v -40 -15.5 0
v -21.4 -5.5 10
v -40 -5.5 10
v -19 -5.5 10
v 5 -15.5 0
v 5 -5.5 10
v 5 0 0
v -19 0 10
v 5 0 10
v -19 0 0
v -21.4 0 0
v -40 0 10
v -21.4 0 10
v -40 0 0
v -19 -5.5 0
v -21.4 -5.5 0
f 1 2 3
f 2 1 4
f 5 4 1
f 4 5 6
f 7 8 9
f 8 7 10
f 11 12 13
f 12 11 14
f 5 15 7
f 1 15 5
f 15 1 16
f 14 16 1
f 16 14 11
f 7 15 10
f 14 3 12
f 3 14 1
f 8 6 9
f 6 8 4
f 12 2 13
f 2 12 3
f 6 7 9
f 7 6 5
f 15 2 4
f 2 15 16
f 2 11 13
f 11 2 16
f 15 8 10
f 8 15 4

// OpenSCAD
// file: wigleUnit.scad
include <utils.scad>;
include <design.scad>;

build = 0;


module wigle_cyl(theta, A_in, A_out, t, wall_t, R, phi0, phi1, cyl, a){
    

    a1 = R*(2*Pi)/dt;

    //a1 = a;
     
    rotate_extrude(angle = phi1 - phi0, $fn = a1) wigle(theta, A_in, A_out, t, wall_t, R, 0, cyl, a);
    }

module wigle_bar(theta, A_in, A_out, t, wall_t, L, solid, cyl, a){
    translate([0, -9*wall_t, 0]) rotate([90,0,90]) linear_extrude(height = L, $fn = a)
        
    wigle(theta, A_in, A_out, t, wall_t, 10*wall_t, solid, cyl, a);
}

module wigle(theta, A_in, A_out, t, wall_t, R, solid, cyl, a){
    
    
    // Wigle
    function fx(i,a,A,t, phase) = A*pow(sin(phase + 180*i/a), 2); 
    function fy(i,a,t) = t*i/a;
    
    theta_in = solid == 1 ? 0 : theta;
    A_in_ = solid == 1 ? 0 : A_in;
    t_in = solid == 1 ? t*cos(theta) : t;
    
    // SINE CORNER:
    points_in = [for (i=[0:1:a]) [max(0, R + cos(theta_in)*fx(i,a,A_in_,t_in,theta_in/2) + sin(theta_in)*fy(a-i,a,t_in) - wall_t), -sin(theta_in)*fx(i,a,A_in_,t_in,theta_in/2) + cos(theta_in)*fy(a-i,a,t_in)]];
    points_out = [for (i=[0:1:a]) [max(0, R + cos(theta)*fx(i,a,A_out,t, 0) + sin(theta)*fy(i,a,t)), -sin(theta)*fx(i,a,A_out,t,0) + cos(theta)*fy(i,a,t)]];
    points_wigle = concat(points_in, points_out);
    
    
    // SPHERE CORNER:
    function fx_sphere(i,a,t) = t*cos(theta + (90-theta)*i/a) - t*cos(theta); 
    function fy_sphere(i,a,t) = t*sin(theta + (90-theta)*i/a) - t*sin(theta);
    function fy_straight(i,a,t) = i/a*t*(1-sin(theta)); 
    
    points_in_sphere = [for (i=[0:1:a]) [max(0, R - max(wall_t, t*cos(theta))), max(0, fy_straight(i,a,t))]];
    points_out_sphere = [for (i=[a:-1:0]) [max(0, R + fx_sphere(i,a,t)),max(0, fy_sphere(i,a,t))]];
    points_sphere = concat(points_in_sphere, points_out_sphere);
    

    // FULL SPHERE CORNER:
    r = wall_t*cos(theta)/2;
    hy = t - r;
    
    function fx_full_sphere(i,a, t, hy, wall_t, theta) = r*cos(theta + 180*i/a) - hy*sin(theta) + r*cos(-theta); 
    function fy_full_sphere(i,a, t, hy, wall_t, theta) = r*sin(theta + 180*i/a) + hy*cos(-theta);
    
    
    points_full_sphere = [for (i=[0:1:a]) [max(0, R - fx_full_sphere(i,a, t, hy, wall_t, theta)), fy_full_sphere(i,a, t, hy, wall_t, theta)], [R, 0], [R - wall_t, 0]];
    

    // SELECT:    
    points = cyl==0 ? points_wigle : cyl==1 ? points_sphere : cyl==2 ? points_full_sphere : 1;
    
    polygon(points);
    
}


module wigle_wigle_square(wx, wy, r, theta, A_in, A_out, t, wall_t, cyl, a){
      
    
    a1 = r*360/(50*Pi)/t*a;
    echo(a1);
    intersection(){
        wigle_square(wx, wy, r, theta, 0, 0, t, max(wx, wy), 0, a);
        union(){
            for (i=[0:1:max(wx,wy)/t+1]){
                rotate_extrude($fn = a1) translate([(1+i)*t,0,0]) rotate([0,0,90]) wigle(0, 0, A_out, t, wall_t, wall_t, 0, cyl, a);
            }
        }
    }
}


module wigle_square(wx, wy, r, theta, A_in, A_out, t, wall_t, cyl, a){
    
    module corner(){
        // corner:
        translate([wx/2 - r, wy/2 - r, 0]) wigle_cyl(theta, A_in, A_out, t, wall_t, r, 0, 90, cyl, a);
        
        x_ = wy/2 - wx/2;
        points = [[0, 8*wy], [wy, x_ + wy], [0, wy/2 - wx/2]];
        //sides
        
        wall_t_y = min(wall_t, wy/2);
        solid = wy/2 < wall_t ? 1 : 0;
        intersection(){
            translate([0, wy/2 - wall_t_y, 0])wigle_bar(theta, A_in, A_out, t, wall_t_y, wx/2 - r, solid, cyl, a);
            linear_extrude(height = t+1) polygon(points);
        }
        
        wall_t_x = min(wall_t, wx/2);
        solid = wx/2 < wall_t ? 1 : 0;
        difference(){
            translate([wx/2 - wall_t_x, 0, 0]) mirror([0,1,0])rotate([0,0,-90]) wigle_bar(theta, A_in, A_out, t, wall_t_x, wy/2 - r, solid, cyl, a);
            linear_extrude(height = t+1) polygon(points);
        }
    }
    
    
    union() {
        corner();
        mirror([1,0,0])corner();
        mirror([0,1,0])corner();
        mirror([1,0,0]) mirror([0,1,0])corner();
    }
}
// file: utils.scad
use <wigleUnit.scad>;


function get_bolt_sink(boltD, add) = boltD/2 + add;

function add(v, i = 0, r = 0) = i < len(v) ? add(v, i + 1, r + v[i]) : r;

function select(vector,indices) = [ for (index = indices) vector[index] ];


function width_scale(sc,sc2, x, mid) = 1 + x*(pow(mid,3)*sc2 - pow(mid,3) + 3*mid - sc*(3*mid - 2)-2)/(mid*(pow(mid,2) - 2*mid + 1)) + pow(x,3)*(pow(mid,2)*sc2 - pow(mid,2) + 2*mid - sc*(2*mid-1) - 1)/(pow(mid,2)*(pow(mid,2) - 2*mid + 1)) + pow(x,2)*(-2*pow(mid,3)*sc2 + 2*pow(mid,3) -3*pow(mid,2) + sc*(3*pow(mid,2) - 1) + 1)/(pow(mid,2)*(pow(mid,2) - 2*mid + 1));


function theta(sc, sc2, i, ni, mid, t, wx) = asin((width_scale(sc,sc2, (i+1)/ni, mid) - width_scale(sc,sc2, i/ni, mid))*wx/(2*t));


function heights(sc, sc2, mid, t, w, ni) = [for (i=[0:1:ni]) t*cos(theta(sc, sc2, i, ni, mid, t, w))];


// shell:
module shell(wall_t, sc, sc2, mid, t, wx, wy, r_corner, ni, A_in, A_out, a){
    heights_ = heights(sc, sc2, mid, t, wx, ni);
    color("DarkSlateGray") 
    union(){
    for (i=[0:1:ni]){
        wx_ = width_scale(sc,sc2, i/ni, mid)*wx;
        wy_ = width_scale(sc,sc2, i/ni, mid)*wy;
        r_corner_ = width_scale(sc,sc2, i/ni, mid)*r_corner;
        
        theta_ = theta(sc, sc2, i, ni, mid, t, wx);
        h = add(select(heights_, [0:1:i-1]));
        translate([0,0,h]) wigle_square(wx_, wy_, r_corner_, theta_, A_in, A_out, t, wall_t, 0, a);
    }
    }
}

module bolt(L, r, a){
    h_ = 2*r/sqrt(3);
    r2_ = 2*r;
    a = 40;
    cylinder(r = r, h = L, $fn = a);
    translate([0,0,L])cylinder(r1 = r, r2 = r2_, h = h_, $fn = a);
    translate([0,0,L+h_])cylinder(r1 = r2_, r2 = r2_, h = r2_, $fn = a);
    }

module bolt_new(L, r, a){
    h_ = 2*r/sqrt(3);
    r2_ = 2*r;
    a = 40;
    translate([0,0,-L])cylinder(r = r, h = L, $fn = a);
    cylinder(r1 = r, r2 = r2_, h = h_, $fn = a);
    translate([0,0,h_])cylinder(r1 = r2_, r2 = r2_, h = r2_, $fn = a);
    }
// file: design.scad
use <utils.scad>;

Pi = 3.141592653589793;
dt = .3;


A = 1;
A_in = A; //A;
A_out = A; //A;
wall_t = .66;
t = 4;

wx = 57.5; //echo(15 + 35 + 1.5 + 2 + 4);
wy = 69;
r_corner = wx/10;
H_ = 124;
ni = floor(H_/t);
H = t*(ni+1);
sc = 1.;
sc2 = 1.;
mid = .65;
w_rim = 4;     
a = floor(t/dt);
echo("a = ", a);
echo("Height = ", H);


    
// BOTS:
d3bolt = 3;
d3bolt_t = 2.8;

// NEMA
nema_spacing = .3;
nema14_x = 35.2 + nema_spacing;
nema14_y = 35.2 + nema_spacing;
nema14_z = 23.0 + nema_spacing;
corner_cut = 2  + nema_spacing;
nema_L_axle = 17;
nema_r_axle = 5/2  + nema_spacing;
nema_bolt_d = d3bolt;
nema_L_bolt = 5;

middle_cyl_r = 11  + nema_spacing;
middle_cyl_h = 2  + nema_spacing;

// DUE dimensions:
due_width = 53.21;
due_length = 104.47;
due_hole_w = 48.26;
due_d_bolt = d3bolt;


move_up = due_length - 15.24 - 6.68 + 6;
x_hole_due  = due_hole_w/2;
hole_coord_due = [[-x_hole_due, move_up, 0], 
                  [x_hole_due, move_up-1.27, 0],
                  [x_hole_due, move_up-76.43, 0],  
                  [-x_hole_due + 5 + 27.94, move_up-76.43 + 24.13, 0],  
                  [-x_hole_due, move_up-82.55, 0],
                  [-x_hole_due + 5, move_up-82.55 + 30.48, 0]
                  ];
                  
bolt_coord_due = hole_coord_due;

// rpi dimensions:
rpi_width = 31;
rpi_length = 69;
rpi_hole_w = 23;
rpi_hole_l = 58;
rpi_d_bolt = 2.8;

x_hole_rpi  = rpi_hole_w/2;
hole_coord_rpi = [[-x_hole_rpi, 0, 0], [x_hole_rpi, 0, 0], [-x_hole_rpi, rpi_hole_l, 0],  [x_hole_rpi, rpi_hole_l, 0]];
bolt_coord_rpi = hole_coord_rpi;


// HAND PARAMS:
sc_hand = 1.;
sc2_hand = 1;
wx_hand = 14;
wy_hand = wx_hand;
r_corner_hand = wx_hand/8;
L_hand = 72;
ni_hand = ceil(L_hand/t);
mid_hand = .8;
rot_hand = 0;
//hand_axle_h = H - nema14_x/2 - 26;
//hand_axle_h = t + 3*nema14_x/2 + 27;
hand_axle_h = H - nema14_x/2 - t; 
hand_z = hand_axle_h; // -ni_hand*t;
t_motor_mount = 4;
hand_shift = 6;
hand_y = wy/2 + wy_hand - 2*t_motor_mount;
axle_x = wx/2 - nema14_x/2 - 1.5;
bolt_wall_t = .7;


echo("Top h = ", H - hand_axle_h - nema14_x/2);

// STEPPER CONTROLLERS
x_hole_stepper = wx/2 - r_corner;
stepper_z0 = t + nema14_x + t;
stepper_z1 = hand_axle_h - nema14_x/2 - t;
stepper_h = stepper_z1 - stepper_z0;


//hole_coord_step = [for (i=[-1,1]) for (j=[0,1]) [i*x_hole_stepper, stepper_z0 + j*stepper_h]];
//bolt_coord_step = hole_coord_step;
hole_coord_step = [];
bolt_coord_step = hole_coord_step;

// BATTERY MOUNT
x_hole_battery = 0;
battery_z0 = t + nema14_x - t;
battery_z1 = hand_axle_h - nema14_x/2 + t;
battery_h = battery_z1 - battery_z0;

hole_coord_battery = [for (j=[0,1]) [x_hole_battery, battery_z0 + j*battery_h]];
bolt_coord_battery = hole_coord_battery;



// MPU6050 GYRO
hole_x_mpu = 0;
hole_y_mpu = 8;
hole_coord_mpu = [for (j=[-1,1])[hole_x_mpu, j*hole_y_mpu]];
bolt_coord_mpu = hole_coord_mpu;

// LEG PARAMS
sc_leg = 1;
sc2_leg = 1.;
mid_leg = .6;
wx_leg = 22;
wy_leg = wx_leg;
r_corner_leg = 2;
ni_leg = 6;
wheel_angle = 0;
//leg_y = wy/2*sc + wy_leg - t_motor_mount - t_motor_mount;

// HEAD PARAMS:
spacing = 4; // distance between rpi and walls
wx_head = rpi_width + wall_t*2 + spacing;
wy_head = wx_head;
r_corner_head = wx_head/10;
ni_head = ceil(75/t);
head_x = -7;

sc_head = 1;
sc2_head = 1;
mid_head = .5;
w_rim_head = w_rim;
heights_head = heights(sc_head, sc2_head, mid_head, t, wx_head, ni_head);

// NECK PARAMS
neck_t = 16;
axle_wall_t = 6;
neck_axle_d = 3.15;
r_pivot_circle = neck_axle_d/2 + axle_wall_t;

neck_h = wx_head/2 + 3;
axle_d_from_wall = 1;
neck_width = 17.5;

neck_pivot_angle_min = 0;
neck_pivot_angle_max = 80;

// COVER PARAMS
thickness_bottom = 2;
bottom_rim_w = 1;
//lid_spacing_scale = .0;
lid_spacing = .3;
switch_d = 5;


// MISC PARAMS
heights_ = heights(sc, sc2, mid, t, wx, ni);
el_mount_h = 3.5;
bolt_sink = 1.2;
// main file
include <design.scad>;
    

build = 0;

module el_mount(hole_coord, bolt_coord, h, bolt_sink, mode, a){
    r_up = due_d_bolt/2 + due_d_bolt/2;
    if (mode==0){
        difference(){
            union(){
                for (point=hole_coord)
                    color("DarkGrey")
                    translate(point) difference() {
                        cylinder(h = h, r1 = h*sqrt(2) + r_up, r2 = r_up, $fn = a);
                        cylinder(h = h+1, r = due_d_bolt/2, $fn = a);
                    }
                }
            for (point=bolt_coord){
                color("Silver") translate(point) mirror([0,0,1])translate([0,0, -h-due_d_bolt/sqrt(3) - bolt_sink]) bolt(h, due_d_bolt/2, a);
            }
        }
    }
    else if (mode == 1)
        color("Silver") translate([-due_width/2, -18, h]) cube([due_width, due_length, 15]);
    else if (mode == 2)
        for (point=bolt_coord){
            color("Silver") translate(point) mirror([0,0,1])translate([0,0, -h-due_d_bolt/sqrt(3)- bolt_sink]) bolt(h, due_d_bolt/2, a);
        }

}

module servo_mount(){
    
    servo_h = 25;
    servo_w = 10;
    servo_L = 24;
    t_flange = 5.5;
    z_flange = 19;
    h_flange = 2.4;
    add_bottom = 5;
    module side_(){
        difference() {
            translate([t_flange, 0,0]) linear_extrude(height = servo_h + 4*add_bottom) polygon(points = [[0,0], [servo_w, 0], [0,servo_w], [-t_flange,servo_w], [-t_flange, 0]]);
            translate([0, 0, z_flange + add_bottom]) cube([t_flange, servo_w, h_flange]);
        }
    }
    
    //translate([servo_h/2, 0, 0]) 
    color("Silver") translate([add_bottom, 0 ,0]) rotate([90,0,-90]) side_();
    //translate([servo_h/2, servo_L, 0]) mirror([0,1,0]) rotate([90,0,-90]) side_();
    
    }



module rpi_mount(h, bolt_sink, mode, a){
    el_mount(hole_coord_rpi, bolt_coord_rpi, h, bolt_sink, mode, a);
}
module due_mount(h, bolt_sink, mode, a){
    el_mount(hole_coord_due, bolt_coord_due, h, bolt_sink, mode, a);
}
module stepper_mount(h, bolt_sink, mode, a){
    el_mount(hole_coord_step, bolt_coord_step, h, bolt_sink, mode, a);
}
module battery_mount(h, bolt_sink, mode, a){
    el_mount(hole_coord_battery, bolt_coord_battery, h, bolt_sink, mode, a);
}
module mpu_mount(h, bolt_sink, mode, a){
    el_mount(hole_coord_mpu, bolt_coord_mpu, h, bolt_sink, mode, a);
}



if (false){
    rpi_mount(4, 4, 2, 40);
    due_mount(4, 4, 2, 40);
}
//stepper_mount(4, bolt_sink, 2, a);
//due_mount(1, 4, 0, 40);
servo_mount();
